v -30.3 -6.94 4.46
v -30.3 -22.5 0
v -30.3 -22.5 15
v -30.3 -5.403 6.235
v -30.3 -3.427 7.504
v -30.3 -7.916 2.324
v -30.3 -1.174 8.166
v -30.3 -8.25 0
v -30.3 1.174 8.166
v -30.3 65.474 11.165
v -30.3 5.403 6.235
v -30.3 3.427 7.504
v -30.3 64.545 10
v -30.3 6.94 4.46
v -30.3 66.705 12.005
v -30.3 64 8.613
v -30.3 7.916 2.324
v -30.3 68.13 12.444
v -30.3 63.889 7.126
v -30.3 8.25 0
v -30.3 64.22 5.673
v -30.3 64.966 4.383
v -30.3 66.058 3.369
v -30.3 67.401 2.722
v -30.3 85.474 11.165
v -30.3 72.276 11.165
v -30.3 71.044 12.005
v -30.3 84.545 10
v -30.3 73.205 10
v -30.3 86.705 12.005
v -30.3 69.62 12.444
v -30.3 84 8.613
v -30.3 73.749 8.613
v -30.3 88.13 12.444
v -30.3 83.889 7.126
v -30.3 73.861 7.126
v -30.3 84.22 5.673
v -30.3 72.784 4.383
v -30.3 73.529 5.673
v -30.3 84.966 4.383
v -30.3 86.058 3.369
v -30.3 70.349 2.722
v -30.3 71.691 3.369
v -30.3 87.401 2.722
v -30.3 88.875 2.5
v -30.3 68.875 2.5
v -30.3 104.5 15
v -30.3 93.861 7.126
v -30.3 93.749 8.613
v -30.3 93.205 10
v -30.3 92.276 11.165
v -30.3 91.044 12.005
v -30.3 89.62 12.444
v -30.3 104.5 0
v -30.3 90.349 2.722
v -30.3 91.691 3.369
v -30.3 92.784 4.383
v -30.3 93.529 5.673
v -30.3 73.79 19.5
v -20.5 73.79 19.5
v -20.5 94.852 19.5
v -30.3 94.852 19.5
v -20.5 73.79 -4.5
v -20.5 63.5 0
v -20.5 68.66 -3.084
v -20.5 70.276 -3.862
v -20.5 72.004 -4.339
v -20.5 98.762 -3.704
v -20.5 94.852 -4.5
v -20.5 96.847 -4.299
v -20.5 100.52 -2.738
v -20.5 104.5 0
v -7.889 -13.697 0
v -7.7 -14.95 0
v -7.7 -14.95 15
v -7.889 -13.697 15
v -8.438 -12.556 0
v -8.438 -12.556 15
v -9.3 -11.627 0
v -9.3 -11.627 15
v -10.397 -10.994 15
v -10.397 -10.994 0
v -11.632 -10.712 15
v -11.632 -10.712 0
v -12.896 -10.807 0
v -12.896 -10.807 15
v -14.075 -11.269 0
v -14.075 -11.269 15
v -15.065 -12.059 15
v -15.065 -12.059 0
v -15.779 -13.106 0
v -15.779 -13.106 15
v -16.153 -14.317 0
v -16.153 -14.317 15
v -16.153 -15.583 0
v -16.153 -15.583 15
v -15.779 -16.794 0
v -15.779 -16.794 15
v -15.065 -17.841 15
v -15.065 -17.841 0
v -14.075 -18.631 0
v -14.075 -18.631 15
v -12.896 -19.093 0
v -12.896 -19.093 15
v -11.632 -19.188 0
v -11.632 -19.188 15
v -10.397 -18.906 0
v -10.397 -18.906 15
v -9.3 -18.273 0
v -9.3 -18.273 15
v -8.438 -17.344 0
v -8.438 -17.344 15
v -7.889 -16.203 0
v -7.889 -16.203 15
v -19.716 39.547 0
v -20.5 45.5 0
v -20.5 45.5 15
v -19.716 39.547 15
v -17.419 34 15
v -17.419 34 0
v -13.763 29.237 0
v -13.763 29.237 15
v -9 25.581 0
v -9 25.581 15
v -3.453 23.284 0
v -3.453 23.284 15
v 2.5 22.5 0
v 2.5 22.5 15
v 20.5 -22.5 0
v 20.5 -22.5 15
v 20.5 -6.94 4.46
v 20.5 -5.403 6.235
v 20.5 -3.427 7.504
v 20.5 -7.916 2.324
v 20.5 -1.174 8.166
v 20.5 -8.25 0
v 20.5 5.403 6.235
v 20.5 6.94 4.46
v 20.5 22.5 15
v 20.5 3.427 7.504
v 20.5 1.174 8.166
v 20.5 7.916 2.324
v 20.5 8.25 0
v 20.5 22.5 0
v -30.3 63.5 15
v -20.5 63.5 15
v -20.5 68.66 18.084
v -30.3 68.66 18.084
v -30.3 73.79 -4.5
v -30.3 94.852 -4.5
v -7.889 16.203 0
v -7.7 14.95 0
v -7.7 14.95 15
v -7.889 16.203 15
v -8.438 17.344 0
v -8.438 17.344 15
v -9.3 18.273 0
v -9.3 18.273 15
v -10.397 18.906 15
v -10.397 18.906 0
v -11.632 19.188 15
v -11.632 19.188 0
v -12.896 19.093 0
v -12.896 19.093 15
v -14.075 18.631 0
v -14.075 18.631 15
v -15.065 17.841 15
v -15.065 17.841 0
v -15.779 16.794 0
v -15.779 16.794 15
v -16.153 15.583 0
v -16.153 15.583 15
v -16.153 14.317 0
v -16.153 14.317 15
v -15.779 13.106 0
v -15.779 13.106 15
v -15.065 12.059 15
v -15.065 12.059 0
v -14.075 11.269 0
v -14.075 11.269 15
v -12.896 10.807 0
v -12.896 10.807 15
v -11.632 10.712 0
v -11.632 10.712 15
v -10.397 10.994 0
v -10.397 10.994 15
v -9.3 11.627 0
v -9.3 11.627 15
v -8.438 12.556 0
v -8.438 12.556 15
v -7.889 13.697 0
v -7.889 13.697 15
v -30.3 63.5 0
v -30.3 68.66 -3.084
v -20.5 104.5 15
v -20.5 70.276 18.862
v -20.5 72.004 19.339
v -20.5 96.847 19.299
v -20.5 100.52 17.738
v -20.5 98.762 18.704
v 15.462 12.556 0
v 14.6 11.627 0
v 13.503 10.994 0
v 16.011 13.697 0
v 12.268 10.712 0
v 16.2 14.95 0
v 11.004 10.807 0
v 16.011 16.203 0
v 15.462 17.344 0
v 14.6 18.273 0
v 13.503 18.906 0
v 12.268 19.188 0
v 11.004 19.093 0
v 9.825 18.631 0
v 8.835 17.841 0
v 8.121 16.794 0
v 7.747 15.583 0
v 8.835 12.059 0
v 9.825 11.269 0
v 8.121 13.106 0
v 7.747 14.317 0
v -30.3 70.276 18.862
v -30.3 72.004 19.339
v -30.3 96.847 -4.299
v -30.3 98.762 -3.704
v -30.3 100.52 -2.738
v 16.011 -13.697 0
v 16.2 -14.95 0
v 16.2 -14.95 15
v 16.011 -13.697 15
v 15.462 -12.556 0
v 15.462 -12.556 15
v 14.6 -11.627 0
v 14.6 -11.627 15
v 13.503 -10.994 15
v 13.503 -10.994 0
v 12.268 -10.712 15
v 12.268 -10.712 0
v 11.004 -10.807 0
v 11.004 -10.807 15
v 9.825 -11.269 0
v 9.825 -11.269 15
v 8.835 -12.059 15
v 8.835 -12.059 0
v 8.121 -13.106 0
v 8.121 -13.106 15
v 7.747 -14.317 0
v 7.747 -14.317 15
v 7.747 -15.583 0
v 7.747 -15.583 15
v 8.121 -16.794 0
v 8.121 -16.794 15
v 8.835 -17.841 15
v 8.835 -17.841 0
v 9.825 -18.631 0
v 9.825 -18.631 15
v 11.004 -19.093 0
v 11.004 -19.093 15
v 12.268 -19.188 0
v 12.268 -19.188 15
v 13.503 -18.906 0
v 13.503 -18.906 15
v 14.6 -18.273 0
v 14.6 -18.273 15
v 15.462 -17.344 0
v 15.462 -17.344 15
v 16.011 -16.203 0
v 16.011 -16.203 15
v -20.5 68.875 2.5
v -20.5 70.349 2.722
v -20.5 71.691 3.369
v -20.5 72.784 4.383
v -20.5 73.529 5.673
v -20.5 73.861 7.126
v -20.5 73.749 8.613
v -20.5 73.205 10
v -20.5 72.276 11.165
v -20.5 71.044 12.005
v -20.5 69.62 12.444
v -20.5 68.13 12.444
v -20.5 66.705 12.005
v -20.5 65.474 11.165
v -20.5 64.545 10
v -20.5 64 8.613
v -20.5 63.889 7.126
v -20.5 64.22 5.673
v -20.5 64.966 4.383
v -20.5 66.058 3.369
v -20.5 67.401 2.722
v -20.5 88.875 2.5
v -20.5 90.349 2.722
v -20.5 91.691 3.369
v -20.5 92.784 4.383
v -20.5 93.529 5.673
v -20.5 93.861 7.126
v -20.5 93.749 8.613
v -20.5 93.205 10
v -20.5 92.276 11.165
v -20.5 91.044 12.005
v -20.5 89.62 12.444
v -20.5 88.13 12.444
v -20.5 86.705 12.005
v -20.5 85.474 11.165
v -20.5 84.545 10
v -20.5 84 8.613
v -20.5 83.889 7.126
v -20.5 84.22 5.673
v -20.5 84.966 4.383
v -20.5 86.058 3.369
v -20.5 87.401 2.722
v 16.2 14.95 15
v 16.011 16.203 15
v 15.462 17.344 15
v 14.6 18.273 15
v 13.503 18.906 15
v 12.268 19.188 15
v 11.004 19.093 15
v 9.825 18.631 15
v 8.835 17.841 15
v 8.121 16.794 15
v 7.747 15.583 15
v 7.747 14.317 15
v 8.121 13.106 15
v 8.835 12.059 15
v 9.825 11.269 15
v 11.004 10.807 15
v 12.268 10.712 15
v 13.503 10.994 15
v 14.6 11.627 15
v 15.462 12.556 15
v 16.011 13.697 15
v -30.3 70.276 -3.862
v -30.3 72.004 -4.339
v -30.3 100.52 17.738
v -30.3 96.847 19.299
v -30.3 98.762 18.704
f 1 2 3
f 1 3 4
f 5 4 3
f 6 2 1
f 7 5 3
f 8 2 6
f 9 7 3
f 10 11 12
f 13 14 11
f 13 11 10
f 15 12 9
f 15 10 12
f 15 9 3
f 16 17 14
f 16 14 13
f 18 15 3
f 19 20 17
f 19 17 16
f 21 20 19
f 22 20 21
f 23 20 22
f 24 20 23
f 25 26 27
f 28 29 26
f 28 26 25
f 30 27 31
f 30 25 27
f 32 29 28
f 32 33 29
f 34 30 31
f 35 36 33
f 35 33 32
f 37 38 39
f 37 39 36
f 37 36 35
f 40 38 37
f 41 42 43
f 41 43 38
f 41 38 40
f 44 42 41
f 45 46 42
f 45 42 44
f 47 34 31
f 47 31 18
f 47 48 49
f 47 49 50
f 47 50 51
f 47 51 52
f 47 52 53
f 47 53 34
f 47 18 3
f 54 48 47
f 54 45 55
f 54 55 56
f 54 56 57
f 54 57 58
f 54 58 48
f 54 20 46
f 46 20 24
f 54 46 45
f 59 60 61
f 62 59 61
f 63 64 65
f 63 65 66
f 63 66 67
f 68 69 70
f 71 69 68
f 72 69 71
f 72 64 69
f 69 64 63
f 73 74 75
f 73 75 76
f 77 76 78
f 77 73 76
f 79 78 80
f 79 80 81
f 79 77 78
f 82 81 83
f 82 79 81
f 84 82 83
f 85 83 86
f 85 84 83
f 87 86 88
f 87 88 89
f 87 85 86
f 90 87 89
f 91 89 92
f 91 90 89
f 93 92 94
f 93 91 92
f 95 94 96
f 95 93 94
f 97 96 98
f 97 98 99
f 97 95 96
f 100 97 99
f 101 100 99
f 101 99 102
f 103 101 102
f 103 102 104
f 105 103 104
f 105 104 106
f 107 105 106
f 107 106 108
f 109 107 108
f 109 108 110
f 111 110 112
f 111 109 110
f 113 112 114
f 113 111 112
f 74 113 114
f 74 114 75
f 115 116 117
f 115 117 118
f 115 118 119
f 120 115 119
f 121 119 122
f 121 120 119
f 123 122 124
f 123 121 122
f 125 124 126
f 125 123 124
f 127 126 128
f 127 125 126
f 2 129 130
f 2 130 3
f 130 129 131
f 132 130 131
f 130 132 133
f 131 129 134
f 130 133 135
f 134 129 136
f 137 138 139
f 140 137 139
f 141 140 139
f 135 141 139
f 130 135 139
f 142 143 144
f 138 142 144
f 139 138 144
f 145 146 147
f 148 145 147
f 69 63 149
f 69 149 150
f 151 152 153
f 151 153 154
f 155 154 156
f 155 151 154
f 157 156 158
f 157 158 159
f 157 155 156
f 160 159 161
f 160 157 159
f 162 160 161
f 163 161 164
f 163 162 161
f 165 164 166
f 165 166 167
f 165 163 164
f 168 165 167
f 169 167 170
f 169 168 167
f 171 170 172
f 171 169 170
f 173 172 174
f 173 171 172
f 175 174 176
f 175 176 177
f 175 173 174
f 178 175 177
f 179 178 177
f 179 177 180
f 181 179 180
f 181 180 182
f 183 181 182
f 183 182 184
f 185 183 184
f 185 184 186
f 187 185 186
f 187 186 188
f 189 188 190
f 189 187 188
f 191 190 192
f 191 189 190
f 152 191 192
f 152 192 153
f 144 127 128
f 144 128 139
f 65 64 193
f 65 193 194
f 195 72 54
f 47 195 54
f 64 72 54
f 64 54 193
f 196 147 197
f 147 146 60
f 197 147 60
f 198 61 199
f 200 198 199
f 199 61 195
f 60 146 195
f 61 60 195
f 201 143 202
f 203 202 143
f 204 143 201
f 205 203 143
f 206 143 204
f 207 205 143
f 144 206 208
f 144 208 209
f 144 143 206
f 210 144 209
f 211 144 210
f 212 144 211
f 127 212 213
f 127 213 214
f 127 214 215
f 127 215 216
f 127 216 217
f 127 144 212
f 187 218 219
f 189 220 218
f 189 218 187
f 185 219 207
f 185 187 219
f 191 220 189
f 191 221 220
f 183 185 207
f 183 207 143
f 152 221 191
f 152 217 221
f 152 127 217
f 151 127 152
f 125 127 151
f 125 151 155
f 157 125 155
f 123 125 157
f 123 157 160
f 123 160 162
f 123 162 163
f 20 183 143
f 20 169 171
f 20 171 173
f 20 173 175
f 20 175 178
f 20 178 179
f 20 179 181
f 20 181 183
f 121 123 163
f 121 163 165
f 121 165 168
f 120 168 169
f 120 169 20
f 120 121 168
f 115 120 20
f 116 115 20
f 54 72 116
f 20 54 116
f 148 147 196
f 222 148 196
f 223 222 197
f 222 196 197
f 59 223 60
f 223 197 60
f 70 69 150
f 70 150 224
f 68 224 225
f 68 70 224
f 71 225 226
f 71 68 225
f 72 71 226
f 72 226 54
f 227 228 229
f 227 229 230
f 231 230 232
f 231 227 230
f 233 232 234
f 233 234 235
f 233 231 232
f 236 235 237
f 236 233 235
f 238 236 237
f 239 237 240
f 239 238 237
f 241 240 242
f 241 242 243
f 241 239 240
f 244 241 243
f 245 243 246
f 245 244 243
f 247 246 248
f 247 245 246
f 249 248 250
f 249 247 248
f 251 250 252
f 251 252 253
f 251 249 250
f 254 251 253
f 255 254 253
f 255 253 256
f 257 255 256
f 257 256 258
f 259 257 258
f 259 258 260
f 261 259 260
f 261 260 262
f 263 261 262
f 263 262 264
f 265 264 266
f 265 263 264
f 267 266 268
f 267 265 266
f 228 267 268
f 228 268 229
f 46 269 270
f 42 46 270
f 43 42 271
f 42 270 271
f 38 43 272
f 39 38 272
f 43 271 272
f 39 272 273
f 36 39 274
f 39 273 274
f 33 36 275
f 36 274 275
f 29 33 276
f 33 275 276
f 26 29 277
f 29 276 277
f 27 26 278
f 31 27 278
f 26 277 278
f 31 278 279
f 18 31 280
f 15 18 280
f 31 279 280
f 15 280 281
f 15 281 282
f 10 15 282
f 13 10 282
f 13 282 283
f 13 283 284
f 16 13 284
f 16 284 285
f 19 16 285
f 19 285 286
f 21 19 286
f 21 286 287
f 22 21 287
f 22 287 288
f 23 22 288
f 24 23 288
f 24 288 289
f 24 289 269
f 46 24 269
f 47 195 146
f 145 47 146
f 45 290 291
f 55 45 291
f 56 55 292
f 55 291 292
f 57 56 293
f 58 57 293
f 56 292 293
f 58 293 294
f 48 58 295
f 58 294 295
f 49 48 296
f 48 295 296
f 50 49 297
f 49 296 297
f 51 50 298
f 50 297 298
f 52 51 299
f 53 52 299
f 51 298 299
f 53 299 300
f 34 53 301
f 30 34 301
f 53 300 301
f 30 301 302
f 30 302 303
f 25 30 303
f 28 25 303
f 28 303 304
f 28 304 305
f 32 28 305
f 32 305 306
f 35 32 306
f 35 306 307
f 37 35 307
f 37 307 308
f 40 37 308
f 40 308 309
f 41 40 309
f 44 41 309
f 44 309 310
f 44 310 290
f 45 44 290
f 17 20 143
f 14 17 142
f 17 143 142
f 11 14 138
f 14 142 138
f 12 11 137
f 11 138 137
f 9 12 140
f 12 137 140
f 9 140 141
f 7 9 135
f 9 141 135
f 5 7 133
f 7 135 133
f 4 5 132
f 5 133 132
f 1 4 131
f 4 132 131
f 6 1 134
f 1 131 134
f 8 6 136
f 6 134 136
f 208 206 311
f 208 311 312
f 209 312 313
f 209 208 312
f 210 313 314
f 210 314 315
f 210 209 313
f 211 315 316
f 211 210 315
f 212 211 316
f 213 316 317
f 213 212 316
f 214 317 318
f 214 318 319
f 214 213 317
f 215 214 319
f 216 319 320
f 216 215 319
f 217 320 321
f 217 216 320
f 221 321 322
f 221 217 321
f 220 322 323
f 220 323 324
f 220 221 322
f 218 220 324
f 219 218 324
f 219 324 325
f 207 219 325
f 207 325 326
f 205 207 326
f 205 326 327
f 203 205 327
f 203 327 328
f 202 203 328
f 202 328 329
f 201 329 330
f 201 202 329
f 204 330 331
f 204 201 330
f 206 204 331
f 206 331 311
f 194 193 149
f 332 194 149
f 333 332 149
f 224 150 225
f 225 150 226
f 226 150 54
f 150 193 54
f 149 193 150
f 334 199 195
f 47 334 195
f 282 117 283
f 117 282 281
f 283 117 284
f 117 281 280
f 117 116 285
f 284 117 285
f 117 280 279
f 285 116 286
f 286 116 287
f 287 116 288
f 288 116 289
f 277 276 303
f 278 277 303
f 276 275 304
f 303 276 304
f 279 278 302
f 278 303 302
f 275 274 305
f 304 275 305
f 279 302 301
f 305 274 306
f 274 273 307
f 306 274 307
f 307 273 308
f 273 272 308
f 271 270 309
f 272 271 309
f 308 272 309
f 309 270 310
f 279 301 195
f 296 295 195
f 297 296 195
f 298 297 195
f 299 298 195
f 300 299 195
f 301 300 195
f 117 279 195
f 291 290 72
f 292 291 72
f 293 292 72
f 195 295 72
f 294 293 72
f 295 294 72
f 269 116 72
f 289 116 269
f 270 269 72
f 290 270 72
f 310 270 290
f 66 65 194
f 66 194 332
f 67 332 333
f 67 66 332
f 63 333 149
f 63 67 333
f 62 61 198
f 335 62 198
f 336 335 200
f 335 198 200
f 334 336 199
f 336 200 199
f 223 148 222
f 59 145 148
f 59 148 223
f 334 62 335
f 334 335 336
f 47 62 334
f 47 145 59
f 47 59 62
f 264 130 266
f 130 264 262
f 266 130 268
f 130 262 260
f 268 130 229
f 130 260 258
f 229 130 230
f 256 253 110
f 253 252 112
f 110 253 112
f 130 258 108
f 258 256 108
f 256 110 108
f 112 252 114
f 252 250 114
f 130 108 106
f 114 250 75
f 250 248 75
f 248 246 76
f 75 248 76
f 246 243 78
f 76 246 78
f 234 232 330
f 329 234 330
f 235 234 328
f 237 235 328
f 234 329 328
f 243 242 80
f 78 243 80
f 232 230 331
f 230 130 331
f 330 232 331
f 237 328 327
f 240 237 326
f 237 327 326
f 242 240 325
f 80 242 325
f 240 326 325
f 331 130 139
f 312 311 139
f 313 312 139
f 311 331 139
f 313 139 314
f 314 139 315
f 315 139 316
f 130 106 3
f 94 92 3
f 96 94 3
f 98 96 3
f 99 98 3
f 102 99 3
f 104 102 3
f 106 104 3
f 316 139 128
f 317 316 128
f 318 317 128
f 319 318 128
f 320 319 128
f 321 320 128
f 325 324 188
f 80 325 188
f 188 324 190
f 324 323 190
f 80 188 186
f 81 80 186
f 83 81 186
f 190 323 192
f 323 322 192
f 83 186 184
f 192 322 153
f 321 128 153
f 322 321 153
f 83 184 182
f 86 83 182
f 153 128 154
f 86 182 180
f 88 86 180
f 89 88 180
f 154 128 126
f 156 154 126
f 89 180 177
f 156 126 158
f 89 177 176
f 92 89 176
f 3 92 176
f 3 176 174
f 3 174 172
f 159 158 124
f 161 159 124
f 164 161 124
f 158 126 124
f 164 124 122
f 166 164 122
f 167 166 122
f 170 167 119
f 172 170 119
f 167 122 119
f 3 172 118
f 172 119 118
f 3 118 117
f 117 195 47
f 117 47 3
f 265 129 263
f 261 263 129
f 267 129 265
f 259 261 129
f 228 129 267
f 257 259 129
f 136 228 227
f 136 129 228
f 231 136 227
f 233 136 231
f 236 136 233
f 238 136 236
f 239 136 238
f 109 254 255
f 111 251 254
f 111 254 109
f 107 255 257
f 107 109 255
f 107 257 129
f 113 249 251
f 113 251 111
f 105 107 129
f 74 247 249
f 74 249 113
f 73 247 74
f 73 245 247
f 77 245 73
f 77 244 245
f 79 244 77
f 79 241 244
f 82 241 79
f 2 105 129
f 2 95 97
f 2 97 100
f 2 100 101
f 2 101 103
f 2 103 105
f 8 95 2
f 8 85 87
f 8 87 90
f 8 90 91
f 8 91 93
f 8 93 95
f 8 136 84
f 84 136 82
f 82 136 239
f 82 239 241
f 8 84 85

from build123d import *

# Parameters (mm, degrees)
SKETCH4_W             = 41
SKETCH4_H             = 45
SKETCH4_R             = 4.25
BOSS_EXTRUDE1_DEPTH   = 15
SKETCH6_W             = 9.8
SKETCH6_H             = 127
BOSS_EXTRUDE2_DEPTH   = 15
SKETCH7_R             = 5
BOSS_EXTRUDE3_DEPTH   = 9.8
BOSS_EXTRUDE3_2_DEPTH = 9.8
BOSS_EXTRUDE3_3_DEPTH = 9.8
BOSS_EXTRUDE3_4_DEPTH = 9.8
SKETCH8_R             = 5
CUT_EXTRUDE2_DEPTH    = 15
SKETCH5_R             = 8.25
CUT_EXTRUDE1_DEPTH    = 65
BOSS_EXTRUDE4_DEPTH   = 15


with BuildPart() as part:
    # Sketch4 → Boss-Extrude1 (new body)
    with BuildSketch(Plane.XY):
        Rectangle(SKETCH4_W, SKETCH4_H)
        with Locations((-11.95, 14.95)):
            Circle(SKETCH4_R, mode=Mode.SUBTRACT)
        with Locations((11.95, 14.95)):
            Circle(SKETCH4_R, mode=Mode.SUBTRACT)
        with Locations((11.95, -14.95)):
            Circle(SKETCH4_R, mode=Mode.SUBTRACT)
        with Locations((-11.95, -14.95)):
            Circle(SKETCH4_R, mode=Mode.SUBTRACT)
    extrude(amount=BOSS_EXTRUDE1_DEPTH)

    # Sketch6 → Boss-Extrude2 (add)
    with BuildSketch(Plane(origin=(0, 0, 0), x_dir=(-1, 0, 0), z_dir=(0, 0, -1))):
        with Locations((25.4, 41)):
            Rectangle(SKETCH6_W, SKETCH6_H)
    extrude(amount=-BOSS_EXTRUDE2_DEPTH)


with BuildPart() as body_2:
    # Sketch7 → Boss-Extrude3 (new body)
    with BuildSketch(Plane(origin=(-20.5, 0, 0), x_dir=(0, 0, -1), z_dir=(1, 0, 0))):
        with Locations((-7.5, 88.874855401)):
            Circle(SKETCH7_R)
    extrude(amount=-BOSS_EXTRUDE3_DEPTH)


with BuildPart() as body_3:
    # Sketch7 → Boss-Extrude3 2 (new body)
    with BuildSketch(Plane(origin=(-20.5, 0, 0), x_dir=(0, 0, -1), z_dir=(1, 0, 0))):
        with Locations((-7.5, 68.874855401)):
            Circle(SKETCH7_R)
    extrude(amount=-BOSS_EXTRUDE3_2_DEPTH)


with BuildPart() as body_4:
    # Sketch7 → Boss-Extrude3 3 (new body)
    with BuildSketch(Plane(origin=(-20.5, 0, 0), x_dir=(0, 0, -1), z_dir=(1, 0, 0))):
        with BuildLine():
            Line((0, 63.5), (3.083845628, 68.660020599))
            ThreePointArc((3.083845628, 68.660020599), (4.139462026, 71.129116286), (4.5, 73.790088262))
            Line((4.5, 73.790088262), (4.5, 94.851850656))
            ThreePointArc((4.5, 94.851850656), (4.049421785, 97.819769719), (2.738291287, 100.520232848))
            Line((2.738291287, 100.520232848), (0, 104.5))
            Line((0, 104.5), (0, 63.5))
        make_face()
    extrude(amount=-BOSS_EXTRUDE3_3_DEPTH)


with BuildPart() as body_5:
    # Sketch7 → Boss-Extrude3 4 (new body)
    with BuildSketch(Plane(origin=(-20.5, 0, 0), x_dir=(0, 0, -1), z_dir=(1, 0, 0))):
        with BuildLine():
            Line((-15, 63.5), (-18.083845628, 68.660020599))
            ThreePointArc((-18.083845628, 68.660020599), (-19.139462026, 71.129116286), (-19.5, 73.790088262))
            Line((-19.5, 73.790088262), (-19.5, 94.851850656))
            ThreePointArc((-19.5, 94.851850656), (-19.049421785, 97.819769719), (-17.738291287, 100.520232848))
            Line((-17.738291287, 100.520232848), (-15, 104.5))
            Line((-15, 104.5), (-15, 63.5))
        make_face()
    extrude(amount=-BOSS_EXTRUDE3_4_DEPTH)


with BuildPart() as cut_extrude2_tool:
    # Sketch8 → Cut-Extrude2 (new body)
    with BuildSketch(Plane(origin=(-20.5, 0, 0), x_dir=(0, 0, -1), z_dir=(1, 0, 0))):
        with Locations((-7.5, 68.874855401)):
            Circle(SKETCH8_R)
        with Locations((-7.5, 88.874855401)):
            Circle(SKETCH8_R)
    extrude(amount=-CUT_EXTRUDE2_DEPTH)


with BuildPart() as part_1:
    add(part.part)

    # Cut-Extrude2: cut by cut_extrude2_tool
    add(cut_extrude2_tool.part, mode=Mode.SUBTRACT)

    # Sketch5 → Cut-Extrude1 (cut)
    with BuildSketch(Plane(origin=(20.5, 0, 0), x_dir=(0, 0, -1), z_dir=(1, 0, 0))):
        Circle(SKETCH5_R)
    extrude(amount=-CUT_EXTRUDE1_DEPTH, mode=Mode.SUBTRACT)

    # Sketch9 → Boss-Extrude4 (add)
    with BuildSketch(Plane(origin=(0, 0, 0), x_dir=(-1, 0, 0), z_dir=(0, 0, -1))):
        with BuildLine():
            Line((-2.5, 22.5), (20.5, 22.5))
            Line((20.5, 22.5), (20.5, 45.5))
            ThreePointArc((20.5, 45.5), (13.763455967, 29.236544033), (-2.5, 22.5))
        make_face()
    extrude(amount=-BOSS_EXTRUDE4_DEPTH)


with BuildPart() as body_2_1:
    add(body_2.part)

    # Cut-Extrude2: cut by cut_extrude2_tool
    add(cut_extrude2_tool.part, mode=Mode.SUBTRACT)


with BuildPart() as body_3_1:
    add(body_3.part)

    # Cut-Extrude2: cut by cut_extrude2_tool
    add(cut_extrude2_tool.part, mode=Mode.SUBTRACT)


solid = Compound([body_4.part, body_5.part, part_1.part])
